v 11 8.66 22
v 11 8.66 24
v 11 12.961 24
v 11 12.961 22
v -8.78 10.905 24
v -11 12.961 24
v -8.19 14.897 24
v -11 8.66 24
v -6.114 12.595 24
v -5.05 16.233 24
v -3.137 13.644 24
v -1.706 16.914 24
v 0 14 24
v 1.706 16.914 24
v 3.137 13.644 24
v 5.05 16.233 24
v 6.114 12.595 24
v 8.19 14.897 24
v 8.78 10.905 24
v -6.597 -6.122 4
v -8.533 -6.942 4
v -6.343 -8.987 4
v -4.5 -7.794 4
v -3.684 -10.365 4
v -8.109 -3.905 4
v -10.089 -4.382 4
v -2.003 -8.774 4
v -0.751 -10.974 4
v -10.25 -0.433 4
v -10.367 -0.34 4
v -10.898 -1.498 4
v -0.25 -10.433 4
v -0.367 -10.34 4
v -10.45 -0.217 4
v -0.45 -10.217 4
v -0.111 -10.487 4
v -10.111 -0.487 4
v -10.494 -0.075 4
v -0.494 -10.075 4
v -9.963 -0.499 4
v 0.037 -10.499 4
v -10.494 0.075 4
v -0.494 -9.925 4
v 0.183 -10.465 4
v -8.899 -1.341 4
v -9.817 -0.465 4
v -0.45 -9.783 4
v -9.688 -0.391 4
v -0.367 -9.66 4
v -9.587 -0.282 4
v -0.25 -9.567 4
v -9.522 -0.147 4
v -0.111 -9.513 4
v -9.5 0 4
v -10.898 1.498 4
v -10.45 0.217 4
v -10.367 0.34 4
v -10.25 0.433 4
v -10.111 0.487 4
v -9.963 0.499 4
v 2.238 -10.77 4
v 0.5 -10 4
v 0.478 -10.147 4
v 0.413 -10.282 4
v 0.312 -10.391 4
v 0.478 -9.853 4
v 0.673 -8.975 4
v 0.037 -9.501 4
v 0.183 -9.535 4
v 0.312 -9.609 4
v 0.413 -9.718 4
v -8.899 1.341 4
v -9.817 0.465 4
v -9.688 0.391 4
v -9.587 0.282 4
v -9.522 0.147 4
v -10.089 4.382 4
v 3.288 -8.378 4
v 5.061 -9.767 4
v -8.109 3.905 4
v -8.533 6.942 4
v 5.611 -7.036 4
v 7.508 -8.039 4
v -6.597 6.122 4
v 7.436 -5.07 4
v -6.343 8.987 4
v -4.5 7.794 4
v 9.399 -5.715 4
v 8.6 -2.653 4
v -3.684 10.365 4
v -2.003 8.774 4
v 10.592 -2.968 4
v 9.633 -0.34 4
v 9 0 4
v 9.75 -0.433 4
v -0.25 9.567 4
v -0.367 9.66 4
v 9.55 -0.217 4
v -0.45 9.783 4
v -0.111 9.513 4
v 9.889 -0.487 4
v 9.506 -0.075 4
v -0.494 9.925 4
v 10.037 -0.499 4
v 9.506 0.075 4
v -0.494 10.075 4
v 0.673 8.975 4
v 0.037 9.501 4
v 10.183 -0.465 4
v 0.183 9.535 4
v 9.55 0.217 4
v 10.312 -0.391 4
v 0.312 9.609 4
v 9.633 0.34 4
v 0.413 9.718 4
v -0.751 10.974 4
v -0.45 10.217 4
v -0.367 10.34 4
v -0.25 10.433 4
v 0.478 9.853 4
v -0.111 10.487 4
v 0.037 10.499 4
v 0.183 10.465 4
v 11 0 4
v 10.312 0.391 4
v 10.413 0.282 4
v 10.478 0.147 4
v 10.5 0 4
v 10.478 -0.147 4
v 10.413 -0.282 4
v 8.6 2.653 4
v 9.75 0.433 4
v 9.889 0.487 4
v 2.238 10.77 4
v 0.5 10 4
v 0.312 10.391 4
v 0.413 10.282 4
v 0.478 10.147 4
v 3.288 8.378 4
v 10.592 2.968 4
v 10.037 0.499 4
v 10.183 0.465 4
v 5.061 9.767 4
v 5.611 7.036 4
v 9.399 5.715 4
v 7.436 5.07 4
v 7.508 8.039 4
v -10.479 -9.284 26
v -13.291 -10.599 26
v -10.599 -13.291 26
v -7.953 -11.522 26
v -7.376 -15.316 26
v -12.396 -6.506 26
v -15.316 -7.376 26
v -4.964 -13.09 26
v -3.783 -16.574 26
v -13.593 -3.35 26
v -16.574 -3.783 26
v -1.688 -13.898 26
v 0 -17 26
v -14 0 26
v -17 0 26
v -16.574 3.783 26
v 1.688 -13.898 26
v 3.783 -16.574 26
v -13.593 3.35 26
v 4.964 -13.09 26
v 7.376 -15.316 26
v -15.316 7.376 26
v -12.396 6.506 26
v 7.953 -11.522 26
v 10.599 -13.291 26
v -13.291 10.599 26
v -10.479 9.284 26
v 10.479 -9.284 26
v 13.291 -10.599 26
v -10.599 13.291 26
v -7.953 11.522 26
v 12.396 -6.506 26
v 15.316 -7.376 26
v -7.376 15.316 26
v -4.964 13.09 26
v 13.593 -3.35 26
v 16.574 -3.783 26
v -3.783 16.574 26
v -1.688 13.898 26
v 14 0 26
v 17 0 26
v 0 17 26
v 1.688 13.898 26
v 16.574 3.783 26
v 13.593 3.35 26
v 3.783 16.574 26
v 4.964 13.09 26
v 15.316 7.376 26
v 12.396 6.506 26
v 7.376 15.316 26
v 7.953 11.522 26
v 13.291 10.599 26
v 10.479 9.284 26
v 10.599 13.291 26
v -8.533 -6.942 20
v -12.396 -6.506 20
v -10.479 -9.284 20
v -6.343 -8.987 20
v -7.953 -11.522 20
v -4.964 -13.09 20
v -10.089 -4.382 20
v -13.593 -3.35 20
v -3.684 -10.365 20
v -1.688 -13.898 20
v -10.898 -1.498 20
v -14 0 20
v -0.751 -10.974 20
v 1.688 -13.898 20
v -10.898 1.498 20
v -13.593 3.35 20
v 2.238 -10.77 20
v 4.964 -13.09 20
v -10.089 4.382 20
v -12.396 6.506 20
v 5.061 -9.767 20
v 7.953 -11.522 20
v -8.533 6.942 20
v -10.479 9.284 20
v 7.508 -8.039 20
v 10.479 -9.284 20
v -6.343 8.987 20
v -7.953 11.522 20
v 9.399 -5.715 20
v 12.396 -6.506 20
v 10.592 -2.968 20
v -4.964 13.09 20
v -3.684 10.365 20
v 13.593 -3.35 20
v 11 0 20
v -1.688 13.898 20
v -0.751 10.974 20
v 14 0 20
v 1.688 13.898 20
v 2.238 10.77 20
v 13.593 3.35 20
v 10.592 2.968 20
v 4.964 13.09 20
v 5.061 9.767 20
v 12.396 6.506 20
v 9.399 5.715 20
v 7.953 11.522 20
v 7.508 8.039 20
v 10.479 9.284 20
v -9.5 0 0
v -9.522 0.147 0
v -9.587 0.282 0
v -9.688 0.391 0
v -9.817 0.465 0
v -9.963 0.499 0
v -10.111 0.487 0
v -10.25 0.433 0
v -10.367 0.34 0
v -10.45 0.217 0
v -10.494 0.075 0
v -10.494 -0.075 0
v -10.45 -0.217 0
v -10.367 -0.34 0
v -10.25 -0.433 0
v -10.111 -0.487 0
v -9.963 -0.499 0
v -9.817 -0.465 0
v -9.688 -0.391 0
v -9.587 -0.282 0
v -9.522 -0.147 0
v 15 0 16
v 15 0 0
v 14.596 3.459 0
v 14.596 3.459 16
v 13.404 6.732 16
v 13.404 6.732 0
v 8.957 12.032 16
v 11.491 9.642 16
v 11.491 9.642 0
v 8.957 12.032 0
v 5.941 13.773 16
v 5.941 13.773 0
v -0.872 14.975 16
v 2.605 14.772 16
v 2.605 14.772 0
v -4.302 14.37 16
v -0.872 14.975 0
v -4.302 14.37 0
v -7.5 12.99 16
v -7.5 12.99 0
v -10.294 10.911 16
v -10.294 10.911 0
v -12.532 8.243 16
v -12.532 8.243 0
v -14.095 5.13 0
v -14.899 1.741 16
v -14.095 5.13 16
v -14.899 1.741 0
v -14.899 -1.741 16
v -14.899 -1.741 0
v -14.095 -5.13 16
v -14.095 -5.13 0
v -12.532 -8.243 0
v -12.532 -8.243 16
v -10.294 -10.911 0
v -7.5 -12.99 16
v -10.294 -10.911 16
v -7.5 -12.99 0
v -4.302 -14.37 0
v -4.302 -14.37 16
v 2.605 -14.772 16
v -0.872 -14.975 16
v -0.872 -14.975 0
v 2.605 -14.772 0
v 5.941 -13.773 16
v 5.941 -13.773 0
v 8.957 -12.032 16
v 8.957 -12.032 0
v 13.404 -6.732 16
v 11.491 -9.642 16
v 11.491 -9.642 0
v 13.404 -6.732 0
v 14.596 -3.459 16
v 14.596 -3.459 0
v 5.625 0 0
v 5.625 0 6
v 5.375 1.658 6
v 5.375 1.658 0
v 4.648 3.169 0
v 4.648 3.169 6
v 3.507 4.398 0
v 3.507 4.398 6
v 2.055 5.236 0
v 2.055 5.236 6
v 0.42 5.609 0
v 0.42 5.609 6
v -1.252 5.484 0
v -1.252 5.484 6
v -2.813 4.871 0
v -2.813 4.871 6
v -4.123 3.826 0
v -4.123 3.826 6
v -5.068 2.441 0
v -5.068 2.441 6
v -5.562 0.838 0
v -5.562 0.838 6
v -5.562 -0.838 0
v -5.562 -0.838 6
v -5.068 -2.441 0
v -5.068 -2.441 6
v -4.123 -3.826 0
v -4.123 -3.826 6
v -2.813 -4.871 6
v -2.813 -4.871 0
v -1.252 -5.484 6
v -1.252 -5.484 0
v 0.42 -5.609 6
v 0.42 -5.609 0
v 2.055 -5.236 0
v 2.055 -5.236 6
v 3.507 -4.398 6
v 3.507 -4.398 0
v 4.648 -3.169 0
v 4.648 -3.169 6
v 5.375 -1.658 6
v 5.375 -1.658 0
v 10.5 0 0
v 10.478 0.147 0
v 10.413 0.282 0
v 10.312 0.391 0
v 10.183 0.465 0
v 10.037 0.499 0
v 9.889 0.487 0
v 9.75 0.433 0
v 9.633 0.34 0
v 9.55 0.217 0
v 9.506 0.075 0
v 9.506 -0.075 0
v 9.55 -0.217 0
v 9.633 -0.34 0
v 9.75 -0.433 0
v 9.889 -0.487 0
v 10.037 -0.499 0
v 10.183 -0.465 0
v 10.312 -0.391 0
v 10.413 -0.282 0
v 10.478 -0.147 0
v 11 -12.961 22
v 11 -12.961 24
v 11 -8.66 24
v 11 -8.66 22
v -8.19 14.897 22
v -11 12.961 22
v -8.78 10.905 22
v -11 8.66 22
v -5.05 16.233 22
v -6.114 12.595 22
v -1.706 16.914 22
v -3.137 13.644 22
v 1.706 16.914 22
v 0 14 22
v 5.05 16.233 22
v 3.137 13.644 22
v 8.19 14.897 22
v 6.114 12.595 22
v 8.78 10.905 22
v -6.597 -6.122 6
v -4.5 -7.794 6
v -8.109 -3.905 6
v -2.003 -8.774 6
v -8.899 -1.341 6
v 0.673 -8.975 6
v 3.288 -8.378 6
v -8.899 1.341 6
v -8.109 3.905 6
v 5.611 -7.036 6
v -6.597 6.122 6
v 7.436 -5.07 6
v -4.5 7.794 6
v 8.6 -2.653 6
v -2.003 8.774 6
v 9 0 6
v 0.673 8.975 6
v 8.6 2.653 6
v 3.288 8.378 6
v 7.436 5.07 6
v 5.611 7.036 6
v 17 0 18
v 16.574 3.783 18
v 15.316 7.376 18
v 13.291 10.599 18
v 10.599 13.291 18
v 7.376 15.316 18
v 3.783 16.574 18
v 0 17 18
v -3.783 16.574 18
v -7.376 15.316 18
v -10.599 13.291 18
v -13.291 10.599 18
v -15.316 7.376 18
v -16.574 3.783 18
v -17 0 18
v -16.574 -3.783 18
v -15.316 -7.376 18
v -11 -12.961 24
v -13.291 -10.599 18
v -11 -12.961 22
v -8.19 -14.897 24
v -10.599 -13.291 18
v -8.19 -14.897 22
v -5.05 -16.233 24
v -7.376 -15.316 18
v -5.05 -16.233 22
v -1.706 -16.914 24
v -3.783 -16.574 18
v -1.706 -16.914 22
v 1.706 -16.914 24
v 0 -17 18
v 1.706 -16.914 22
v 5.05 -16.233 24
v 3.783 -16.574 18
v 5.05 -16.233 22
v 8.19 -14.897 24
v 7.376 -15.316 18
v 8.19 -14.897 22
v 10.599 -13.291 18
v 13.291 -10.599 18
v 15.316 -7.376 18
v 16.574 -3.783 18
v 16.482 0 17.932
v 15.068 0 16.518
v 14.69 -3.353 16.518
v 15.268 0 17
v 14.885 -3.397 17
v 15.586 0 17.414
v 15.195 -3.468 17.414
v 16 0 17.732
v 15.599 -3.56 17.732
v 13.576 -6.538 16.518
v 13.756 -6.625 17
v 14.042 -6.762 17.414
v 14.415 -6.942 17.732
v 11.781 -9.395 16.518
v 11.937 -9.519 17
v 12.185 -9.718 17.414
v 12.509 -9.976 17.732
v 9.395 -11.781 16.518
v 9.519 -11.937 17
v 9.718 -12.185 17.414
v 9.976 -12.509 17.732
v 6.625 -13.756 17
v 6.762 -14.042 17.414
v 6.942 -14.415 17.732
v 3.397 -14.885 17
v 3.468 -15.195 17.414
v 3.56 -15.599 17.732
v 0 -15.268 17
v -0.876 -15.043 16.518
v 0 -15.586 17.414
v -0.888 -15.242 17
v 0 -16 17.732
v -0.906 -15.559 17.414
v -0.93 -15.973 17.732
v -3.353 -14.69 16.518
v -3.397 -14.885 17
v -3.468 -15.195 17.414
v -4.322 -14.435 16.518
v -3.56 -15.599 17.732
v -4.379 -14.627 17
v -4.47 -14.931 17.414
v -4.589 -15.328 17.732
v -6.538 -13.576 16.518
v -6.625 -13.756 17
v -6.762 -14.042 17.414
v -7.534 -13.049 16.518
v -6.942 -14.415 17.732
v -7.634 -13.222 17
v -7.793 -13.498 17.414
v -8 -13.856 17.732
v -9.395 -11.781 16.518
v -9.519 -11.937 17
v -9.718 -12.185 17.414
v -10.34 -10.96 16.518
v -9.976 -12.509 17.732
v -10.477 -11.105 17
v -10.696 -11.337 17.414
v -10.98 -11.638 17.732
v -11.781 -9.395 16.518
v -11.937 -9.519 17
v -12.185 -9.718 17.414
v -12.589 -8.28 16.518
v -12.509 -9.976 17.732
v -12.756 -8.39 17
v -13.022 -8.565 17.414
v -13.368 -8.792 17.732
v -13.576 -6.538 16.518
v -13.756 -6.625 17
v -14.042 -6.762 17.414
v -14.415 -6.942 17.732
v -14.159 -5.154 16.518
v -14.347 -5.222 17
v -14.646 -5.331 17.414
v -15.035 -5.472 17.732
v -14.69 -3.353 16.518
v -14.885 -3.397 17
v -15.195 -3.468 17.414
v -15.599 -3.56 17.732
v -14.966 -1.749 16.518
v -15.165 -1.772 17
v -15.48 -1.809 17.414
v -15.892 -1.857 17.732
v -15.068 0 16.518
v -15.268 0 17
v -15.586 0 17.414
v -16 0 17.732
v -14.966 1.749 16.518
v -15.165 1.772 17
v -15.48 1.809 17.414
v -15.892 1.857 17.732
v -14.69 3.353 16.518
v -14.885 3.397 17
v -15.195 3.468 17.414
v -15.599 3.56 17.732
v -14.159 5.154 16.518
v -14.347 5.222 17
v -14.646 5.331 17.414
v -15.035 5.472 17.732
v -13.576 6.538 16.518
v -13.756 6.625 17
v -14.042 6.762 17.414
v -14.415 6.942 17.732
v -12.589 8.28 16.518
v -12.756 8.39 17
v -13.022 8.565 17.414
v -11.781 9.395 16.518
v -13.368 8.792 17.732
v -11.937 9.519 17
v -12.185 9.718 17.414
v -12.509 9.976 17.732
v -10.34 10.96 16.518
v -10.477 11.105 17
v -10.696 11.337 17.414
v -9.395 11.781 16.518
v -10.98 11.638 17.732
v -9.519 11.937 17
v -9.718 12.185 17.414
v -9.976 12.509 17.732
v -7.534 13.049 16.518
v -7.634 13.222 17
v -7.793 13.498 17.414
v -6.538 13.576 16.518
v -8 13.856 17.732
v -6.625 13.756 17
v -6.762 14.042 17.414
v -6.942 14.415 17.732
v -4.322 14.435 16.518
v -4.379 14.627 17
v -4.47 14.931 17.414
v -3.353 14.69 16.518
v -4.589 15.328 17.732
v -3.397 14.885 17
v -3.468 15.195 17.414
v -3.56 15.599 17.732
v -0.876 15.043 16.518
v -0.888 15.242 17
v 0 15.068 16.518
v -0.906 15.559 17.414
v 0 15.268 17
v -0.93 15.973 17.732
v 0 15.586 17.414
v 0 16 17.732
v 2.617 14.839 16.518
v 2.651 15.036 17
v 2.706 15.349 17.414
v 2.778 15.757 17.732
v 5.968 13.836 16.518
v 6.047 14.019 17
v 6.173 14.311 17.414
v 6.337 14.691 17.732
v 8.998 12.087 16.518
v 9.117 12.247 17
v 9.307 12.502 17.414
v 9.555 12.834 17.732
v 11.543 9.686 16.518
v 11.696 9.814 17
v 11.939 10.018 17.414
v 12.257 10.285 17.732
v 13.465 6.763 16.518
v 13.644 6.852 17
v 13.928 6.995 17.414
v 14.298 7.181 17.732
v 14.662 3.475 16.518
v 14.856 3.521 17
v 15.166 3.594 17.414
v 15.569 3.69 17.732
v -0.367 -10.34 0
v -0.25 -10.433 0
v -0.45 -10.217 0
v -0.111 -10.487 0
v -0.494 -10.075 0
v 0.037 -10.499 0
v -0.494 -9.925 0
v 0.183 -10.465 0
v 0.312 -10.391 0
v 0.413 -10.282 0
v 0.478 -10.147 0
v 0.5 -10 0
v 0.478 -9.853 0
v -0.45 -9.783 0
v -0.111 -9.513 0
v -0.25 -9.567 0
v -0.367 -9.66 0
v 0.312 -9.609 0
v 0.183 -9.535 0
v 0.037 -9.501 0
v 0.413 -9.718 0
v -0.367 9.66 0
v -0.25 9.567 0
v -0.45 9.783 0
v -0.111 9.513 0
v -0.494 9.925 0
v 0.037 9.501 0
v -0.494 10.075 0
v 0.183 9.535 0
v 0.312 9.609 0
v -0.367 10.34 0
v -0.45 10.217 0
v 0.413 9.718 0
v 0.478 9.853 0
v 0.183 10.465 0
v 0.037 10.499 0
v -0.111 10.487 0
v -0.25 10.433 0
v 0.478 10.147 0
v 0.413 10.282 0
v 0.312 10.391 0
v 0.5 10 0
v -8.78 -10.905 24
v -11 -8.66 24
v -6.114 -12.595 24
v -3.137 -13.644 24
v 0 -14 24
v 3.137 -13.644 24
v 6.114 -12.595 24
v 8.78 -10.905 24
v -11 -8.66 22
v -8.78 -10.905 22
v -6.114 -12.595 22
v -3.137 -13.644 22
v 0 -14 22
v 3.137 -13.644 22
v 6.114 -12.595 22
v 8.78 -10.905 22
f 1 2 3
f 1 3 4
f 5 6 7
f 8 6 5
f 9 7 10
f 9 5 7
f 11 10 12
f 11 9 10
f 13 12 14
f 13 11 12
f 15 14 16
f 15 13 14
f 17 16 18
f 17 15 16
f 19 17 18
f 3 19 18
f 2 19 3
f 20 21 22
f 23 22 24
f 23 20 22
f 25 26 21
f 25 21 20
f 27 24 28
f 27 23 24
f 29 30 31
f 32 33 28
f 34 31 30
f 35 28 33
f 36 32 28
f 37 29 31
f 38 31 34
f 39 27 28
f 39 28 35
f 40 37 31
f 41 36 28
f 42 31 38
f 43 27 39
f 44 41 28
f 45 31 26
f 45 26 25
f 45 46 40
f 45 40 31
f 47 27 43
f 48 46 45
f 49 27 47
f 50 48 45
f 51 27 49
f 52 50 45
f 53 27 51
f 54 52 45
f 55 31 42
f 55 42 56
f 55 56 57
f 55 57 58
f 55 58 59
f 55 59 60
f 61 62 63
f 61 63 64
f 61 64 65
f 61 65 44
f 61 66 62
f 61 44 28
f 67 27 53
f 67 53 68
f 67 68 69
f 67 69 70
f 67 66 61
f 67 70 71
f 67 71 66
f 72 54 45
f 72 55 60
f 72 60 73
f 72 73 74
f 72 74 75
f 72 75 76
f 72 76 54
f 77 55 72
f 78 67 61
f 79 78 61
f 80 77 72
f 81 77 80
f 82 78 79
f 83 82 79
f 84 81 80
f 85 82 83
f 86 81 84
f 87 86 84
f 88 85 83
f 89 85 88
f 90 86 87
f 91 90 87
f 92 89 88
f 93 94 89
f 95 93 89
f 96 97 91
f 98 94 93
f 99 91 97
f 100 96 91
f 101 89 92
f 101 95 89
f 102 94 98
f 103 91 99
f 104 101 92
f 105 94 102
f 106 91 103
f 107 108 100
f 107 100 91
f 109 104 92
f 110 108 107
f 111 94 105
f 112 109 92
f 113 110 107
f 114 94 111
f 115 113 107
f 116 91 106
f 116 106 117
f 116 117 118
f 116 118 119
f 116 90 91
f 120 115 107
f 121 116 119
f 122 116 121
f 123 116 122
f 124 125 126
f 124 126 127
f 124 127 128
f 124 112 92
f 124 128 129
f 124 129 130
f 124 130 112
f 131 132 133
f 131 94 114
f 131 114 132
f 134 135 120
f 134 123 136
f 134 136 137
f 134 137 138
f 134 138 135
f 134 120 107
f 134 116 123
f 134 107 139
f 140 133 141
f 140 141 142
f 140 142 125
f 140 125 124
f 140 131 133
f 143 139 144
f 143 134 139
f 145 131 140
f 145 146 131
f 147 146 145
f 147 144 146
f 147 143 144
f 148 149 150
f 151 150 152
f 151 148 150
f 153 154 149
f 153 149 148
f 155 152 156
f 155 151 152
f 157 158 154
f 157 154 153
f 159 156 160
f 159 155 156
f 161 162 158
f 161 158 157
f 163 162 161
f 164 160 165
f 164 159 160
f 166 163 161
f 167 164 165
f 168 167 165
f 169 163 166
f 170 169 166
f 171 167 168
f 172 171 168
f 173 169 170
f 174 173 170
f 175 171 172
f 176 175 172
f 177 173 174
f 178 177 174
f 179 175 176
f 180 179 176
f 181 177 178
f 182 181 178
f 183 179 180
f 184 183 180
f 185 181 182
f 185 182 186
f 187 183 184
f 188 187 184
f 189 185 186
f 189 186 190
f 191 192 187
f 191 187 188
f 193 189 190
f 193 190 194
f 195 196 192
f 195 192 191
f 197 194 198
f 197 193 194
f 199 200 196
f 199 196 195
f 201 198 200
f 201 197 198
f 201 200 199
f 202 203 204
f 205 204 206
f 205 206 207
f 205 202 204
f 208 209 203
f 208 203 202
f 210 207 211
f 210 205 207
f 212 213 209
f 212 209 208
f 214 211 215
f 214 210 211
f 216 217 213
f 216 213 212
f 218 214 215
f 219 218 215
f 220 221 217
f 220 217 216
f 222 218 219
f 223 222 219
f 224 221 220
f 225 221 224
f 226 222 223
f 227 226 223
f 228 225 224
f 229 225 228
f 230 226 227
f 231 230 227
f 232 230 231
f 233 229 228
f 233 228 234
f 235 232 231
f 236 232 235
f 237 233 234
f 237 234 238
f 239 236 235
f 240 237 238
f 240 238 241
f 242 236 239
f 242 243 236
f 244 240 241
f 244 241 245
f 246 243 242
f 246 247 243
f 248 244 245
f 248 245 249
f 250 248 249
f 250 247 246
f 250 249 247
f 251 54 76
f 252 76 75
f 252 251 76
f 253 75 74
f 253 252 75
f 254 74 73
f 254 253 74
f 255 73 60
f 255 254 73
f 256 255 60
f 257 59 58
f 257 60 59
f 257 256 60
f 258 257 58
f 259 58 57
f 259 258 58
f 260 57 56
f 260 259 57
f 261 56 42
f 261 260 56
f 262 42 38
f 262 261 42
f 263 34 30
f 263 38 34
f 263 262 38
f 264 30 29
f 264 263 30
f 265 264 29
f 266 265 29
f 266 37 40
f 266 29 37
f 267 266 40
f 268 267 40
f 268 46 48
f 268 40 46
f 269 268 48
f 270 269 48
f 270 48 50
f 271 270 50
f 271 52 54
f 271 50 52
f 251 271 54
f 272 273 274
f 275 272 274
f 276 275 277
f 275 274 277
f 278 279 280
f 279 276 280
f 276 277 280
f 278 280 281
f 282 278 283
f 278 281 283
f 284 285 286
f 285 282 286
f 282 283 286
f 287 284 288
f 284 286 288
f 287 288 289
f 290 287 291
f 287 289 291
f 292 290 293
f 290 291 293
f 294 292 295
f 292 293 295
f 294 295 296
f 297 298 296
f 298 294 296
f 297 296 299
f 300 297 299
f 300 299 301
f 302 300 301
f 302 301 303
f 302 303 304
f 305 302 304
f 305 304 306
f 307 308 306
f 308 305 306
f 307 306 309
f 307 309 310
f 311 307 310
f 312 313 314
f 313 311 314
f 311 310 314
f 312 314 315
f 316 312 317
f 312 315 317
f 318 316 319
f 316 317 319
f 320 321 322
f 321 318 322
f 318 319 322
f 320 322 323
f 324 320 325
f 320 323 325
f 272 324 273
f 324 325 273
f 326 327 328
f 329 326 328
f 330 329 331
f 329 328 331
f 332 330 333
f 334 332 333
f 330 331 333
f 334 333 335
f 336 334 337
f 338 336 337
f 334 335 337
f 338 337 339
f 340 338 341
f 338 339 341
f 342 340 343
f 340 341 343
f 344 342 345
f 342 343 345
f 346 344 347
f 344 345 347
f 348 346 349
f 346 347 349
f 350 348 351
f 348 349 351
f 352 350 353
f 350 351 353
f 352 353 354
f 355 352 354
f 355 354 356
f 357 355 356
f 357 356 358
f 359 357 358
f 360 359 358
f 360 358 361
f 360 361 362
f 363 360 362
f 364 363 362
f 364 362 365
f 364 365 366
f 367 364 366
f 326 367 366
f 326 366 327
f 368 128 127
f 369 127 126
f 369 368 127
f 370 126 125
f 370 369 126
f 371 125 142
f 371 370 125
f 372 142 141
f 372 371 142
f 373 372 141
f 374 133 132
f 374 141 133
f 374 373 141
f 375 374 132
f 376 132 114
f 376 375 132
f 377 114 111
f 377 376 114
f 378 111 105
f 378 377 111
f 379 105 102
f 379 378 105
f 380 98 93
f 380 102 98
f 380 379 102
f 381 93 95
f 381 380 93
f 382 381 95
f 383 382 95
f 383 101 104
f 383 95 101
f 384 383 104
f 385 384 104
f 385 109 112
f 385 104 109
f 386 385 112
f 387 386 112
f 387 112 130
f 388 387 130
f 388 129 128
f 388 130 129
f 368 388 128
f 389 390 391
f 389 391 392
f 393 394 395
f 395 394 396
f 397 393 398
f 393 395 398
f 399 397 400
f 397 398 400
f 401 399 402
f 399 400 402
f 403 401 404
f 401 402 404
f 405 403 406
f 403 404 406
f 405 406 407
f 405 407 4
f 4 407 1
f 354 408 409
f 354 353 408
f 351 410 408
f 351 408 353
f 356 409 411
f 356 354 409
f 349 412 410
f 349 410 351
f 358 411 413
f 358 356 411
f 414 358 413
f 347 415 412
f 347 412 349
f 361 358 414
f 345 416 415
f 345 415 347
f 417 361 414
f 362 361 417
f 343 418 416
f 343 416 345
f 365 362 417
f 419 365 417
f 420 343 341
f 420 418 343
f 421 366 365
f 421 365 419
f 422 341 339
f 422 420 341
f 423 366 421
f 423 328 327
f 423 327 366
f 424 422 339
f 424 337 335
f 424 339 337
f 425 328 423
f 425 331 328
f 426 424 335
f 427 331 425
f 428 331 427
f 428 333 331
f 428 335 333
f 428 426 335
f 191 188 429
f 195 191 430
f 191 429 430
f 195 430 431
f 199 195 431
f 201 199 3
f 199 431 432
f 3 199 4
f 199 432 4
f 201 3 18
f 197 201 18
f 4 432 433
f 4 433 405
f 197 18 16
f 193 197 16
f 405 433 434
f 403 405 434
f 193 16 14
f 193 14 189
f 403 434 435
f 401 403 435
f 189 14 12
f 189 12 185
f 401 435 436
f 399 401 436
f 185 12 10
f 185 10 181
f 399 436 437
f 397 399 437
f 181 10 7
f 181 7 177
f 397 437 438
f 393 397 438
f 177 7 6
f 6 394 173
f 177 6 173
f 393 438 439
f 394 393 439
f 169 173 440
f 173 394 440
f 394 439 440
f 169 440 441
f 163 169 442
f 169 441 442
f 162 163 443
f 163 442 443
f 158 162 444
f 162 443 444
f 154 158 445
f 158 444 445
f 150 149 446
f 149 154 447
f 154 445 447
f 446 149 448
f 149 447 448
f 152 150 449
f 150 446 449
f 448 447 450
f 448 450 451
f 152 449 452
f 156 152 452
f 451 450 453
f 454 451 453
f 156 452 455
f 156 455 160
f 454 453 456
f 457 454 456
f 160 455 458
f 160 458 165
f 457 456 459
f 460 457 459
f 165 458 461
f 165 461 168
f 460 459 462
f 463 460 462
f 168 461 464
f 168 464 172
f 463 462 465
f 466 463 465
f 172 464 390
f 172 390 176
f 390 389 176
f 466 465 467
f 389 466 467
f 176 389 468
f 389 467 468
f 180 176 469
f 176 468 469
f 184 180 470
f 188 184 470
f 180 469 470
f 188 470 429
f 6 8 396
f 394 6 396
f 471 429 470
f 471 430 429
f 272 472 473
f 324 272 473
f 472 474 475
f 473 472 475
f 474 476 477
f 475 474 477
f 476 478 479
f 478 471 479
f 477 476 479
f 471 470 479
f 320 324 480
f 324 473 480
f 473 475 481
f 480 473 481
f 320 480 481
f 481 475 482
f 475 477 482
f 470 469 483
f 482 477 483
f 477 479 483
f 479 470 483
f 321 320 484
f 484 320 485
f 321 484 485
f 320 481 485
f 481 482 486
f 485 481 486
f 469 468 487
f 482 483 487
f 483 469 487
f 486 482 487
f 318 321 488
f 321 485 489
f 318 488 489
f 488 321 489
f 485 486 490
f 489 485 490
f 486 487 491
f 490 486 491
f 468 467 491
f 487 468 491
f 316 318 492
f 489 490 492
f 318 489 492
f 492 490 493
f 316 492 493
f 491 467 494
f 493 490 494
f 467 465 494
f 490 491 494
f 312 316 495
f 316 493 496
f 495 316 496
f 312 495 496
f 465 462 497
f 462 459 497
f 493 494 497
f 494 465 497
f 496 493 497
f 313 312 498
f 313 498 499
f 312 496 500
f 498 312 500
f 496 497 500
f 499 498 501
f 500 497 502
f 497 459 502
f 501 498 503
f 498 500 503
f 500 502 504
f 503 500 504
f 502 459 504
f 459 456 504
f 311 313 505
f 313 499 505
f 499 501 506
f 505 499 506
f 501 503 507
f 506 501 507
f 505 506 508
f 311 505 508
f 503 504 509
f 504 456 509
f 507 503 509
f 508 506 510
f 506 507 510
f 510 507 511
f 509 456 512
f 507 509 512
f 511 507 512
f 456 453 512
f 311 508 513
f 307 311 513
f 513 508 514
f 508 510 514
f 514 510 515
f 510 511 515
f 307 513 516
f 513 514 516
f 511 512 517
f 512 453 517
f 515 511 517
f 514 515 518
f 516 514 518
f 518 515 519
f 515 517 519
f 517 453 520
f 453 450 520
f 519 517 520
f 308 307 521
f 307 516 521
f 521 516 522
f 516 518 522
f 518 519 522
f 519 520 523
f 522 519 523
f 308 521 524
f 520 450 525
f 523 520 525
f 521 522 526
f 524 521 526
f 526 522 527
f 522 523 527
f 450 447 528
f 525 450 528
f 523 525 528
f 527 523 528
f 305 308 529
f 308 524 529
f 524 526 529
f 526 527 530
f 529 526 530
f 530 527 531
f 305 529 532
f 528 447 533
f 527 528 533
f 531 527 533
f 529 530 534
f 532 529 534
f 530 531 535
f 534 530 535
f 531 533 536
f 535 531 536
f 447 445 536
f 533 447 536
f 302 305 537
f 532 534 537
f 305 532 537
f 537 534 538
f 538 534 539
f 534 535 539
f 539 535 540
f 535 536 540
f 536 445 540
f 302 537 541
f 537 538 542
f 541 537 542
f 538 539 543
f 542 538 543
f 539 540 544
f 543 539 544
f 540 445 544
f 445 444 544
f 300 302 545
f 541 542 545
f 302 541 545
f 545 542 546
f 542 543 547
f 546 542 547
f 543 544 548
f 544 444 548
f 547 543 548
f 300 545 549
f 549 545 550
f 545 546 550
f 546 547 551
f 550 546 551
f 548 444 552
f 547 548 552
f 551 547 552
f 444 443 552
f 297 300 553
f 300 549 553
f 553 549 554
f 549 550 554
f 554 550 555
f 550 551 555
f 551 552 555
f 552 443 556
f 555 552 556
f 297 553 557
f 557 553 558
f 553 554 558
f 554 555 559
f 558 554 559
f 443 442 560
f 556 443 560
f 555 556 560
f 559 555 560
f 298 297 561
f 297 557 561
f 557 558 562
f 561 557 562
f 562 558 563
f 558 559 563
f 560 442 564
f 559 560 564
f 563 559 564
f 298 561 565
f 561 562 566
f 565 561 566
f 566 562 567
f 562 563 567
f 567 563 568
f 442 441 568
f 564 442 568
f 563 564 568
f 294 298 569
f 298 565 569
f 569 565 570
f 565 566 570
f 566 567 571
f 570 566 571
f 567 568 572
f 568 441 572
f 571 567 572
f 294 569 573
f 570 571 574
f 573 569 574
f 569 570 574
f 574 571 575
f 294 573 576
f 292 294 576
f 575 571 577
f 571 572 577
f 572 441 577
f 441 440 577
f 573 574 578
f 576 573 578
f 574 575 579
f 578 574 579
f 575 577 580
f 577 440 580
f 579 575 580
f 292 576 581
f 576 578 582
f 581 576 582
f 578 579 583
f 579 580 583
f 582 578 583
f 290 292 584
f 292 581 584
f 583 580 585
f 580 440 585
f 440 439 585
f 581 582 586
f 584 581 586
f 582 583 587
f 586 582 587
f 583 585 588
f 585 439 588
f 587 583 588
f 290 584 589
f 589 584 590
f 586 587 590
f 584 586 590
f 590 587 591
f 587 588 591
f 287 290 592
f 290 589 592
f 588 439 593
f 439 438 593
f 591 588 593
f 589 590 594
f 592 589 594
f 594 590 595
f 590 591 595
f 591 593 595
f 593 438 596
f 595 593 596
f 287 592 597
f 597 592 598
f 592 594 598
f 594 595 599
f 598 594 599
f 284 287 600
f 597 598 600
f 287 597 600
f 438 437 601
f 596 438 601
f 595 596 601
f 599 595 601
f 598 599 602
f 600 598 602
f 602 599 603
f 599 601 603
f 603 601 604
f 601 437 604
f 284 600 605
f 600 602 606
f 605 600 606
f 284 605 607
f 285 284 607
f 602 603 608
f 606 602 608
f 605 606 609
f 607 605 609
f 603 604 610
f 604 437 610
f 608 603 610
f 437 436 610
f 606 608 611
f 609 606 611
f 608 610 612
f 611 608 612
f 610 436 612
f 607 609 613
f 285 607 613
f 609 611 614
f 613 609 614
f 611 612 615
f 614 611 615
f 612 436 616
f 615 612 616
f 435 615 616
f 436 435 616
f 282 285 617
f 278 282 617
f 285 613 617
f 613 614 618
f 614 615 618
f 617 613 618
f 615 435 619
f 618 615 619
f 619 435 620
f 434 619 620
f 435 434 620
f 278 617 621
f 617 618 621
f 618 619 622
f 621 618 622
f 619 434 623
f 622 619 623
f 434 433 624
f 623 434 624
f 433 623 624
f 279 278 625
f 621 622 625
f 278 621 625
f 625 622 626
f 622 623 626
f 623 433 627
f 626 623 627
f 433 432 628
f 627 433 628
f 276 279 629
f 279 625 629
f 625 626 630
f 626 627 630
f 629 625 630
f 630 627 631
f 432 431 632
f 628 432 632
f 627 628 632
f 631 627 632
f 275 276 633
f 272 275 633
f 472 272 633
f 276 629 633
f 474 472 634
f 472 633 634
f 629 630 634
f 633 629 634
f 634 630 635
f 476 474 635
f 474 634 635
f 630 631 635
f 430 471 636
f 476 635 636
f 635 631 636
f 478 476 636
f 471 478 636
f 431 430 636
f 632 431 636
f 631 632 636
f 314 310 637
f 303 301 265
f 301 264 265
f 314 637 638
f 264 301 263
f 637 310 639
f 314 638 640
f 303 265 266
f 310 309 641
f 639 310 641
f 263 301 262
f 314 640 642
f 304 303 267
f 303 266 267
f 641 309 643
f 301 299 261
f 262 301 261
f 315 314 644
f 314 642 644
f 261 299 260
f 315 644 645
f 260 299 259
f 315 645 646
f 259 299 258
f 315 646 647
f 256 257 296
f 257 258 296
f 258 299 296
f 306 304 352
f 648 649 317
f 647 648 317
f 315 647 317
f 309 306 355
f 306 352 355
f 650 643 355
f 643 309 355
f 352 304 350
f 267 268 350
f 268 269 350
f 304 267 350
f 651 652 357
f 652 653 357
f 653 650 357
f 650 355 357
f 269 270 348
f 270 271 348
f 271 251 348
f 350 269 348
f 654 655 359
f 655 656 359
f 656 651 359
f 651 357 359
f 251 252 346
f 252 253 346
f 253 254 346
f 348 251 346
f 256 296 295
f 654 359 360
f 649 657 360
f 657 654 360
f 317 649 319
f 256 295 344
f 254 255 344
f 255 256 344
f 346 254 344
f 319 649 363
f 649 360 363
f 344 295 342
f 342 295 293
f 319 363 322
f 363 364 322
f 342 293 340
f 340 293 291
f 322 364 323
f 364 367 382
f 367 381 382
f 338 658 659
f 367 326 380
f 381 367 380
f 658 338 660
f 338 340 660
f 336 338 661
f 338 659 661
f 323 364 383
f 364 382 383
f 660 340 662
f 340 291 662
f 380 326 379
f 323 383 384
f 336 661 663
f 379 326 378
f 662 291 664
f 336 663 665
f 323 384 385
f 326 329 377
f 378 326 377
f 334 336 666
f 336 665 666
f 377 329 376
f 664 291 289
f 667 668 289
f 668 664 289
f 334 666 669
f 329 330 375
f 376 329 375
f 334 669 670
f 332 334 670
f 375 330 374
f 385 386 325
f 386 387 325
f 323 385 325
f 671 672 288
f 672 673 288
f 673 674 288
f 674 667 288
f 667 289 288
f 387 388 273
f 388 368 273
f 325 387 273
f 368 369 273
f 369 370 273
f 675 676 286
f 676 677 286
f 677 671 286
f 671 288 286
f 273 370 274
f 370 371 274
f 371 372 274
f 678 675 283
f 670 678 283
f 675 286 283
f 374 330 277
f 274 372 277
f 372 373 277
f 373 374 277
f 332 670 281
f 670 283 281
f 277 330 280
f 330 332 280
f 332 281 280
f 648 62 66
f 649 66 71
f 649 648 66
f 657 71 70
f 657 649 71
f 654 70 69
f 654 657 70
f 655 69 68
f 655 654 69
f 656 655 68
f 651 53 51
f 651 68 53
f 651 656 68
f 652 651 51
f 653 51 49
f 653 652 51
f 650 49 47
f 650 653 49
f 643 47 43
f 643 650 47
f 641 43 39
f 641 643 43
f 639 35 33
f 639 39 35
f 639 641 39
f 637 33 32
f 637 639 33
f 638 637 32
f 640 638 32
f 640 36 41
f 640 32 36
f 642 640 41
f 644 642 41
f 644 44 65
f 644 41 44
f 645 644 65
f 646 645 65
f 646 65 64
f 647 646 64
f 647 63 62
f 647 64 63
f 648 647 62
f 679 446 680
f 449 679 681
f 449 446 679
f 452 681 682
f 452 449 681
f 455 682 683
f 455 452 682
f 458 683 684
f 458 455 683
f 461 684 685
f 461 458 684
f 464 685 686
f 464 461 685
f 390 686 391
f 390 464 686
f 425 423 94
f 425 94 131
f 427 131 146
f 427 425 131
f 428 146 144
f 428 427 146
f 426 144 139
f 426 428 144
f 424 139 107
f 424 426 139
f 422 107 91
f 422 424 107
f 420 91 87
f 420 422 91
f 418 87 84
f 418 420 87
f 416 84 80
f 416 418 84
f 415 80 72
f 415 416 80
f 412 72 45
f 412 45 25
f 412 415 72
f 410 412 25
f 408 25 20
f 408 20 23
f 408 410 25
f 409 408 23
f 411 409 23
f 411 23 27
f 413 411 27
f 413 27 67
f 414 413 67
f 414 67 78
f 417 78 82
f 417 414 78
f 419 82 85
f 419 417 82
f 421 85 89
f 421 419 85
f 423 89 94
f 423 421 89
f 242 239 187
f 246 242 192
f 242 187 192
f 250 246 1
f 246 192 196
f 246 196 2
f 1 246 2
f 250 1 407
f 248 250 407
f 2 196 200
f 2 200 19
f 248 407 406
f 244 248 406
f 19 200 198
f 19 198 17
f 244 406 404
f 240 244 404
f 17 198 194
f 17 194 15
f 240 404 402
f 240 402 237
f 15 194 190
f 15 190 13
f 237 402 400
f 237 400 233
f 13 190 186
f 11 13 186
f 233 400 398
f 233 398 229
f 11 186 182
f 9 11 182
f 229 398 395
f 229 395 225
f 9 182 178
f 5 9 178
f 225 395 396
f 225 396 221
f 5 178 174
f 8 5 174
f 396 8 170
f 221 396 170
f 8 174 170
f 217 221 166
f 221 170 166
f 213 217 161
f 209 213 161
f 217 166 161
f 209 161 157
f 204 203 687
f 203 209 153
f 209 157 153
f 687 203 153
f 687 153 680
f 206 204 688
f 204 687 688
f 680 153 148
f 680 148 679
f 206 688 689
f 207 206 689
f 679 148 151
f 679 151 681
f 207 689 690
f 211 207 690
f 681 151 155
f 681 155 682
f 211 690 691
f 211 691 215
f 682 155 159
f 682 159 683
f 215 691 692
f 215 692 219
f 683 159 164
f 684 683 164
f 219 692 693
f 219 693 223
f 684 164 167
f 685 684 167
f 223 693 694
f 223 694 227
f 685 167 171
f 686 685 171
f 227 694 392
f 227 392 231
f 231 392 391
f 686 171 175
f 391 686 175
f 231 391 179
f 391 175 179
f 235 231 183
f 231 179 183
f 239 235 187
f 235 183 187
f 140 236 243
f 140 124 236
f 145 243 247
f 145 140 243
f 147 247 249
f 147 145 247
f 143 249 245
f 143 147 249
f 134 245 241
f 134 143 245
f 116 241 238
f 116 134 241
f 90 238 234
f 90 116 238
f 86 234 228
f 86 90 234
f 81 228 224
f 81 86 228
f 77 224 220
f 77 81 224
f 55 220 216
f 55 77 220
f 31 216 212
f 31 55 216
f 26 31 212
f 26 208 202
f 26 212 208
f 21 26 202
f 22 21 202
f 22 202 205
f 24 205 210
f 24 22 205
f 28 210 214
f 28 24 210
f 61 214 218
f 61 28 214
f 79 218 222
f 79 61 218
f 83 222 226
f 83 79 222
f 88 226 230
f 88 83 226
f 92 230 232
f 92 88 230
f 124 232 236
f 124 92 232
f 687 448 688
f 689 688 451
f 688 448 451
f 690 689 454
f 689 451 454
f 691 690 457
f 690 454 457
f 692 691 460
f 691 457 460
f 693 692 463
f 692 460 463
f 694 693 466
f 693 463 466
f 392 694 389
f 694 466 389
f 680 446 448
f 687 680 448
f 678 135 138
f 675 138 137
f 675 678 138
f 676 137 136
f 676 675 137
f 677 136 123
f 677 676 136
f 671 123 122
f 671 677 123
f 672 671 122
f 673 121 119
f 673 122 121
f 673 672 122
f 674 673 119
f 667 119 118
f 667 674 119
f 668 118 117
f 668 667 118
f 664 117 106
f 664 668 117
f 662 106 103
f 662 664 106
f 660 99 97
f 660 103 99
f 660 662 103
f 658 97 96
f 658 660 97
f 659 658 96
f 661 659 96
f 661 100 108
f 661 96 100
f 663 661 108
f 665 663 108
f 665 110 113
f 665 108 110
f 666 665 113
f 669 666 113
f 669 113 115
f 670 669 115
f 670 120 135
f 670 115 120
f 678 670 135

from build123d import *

# Parameters (mm, degrees)
SKETCH1_R                = 15
BOSS_EXTRUDE5_DEPTH      = 26
SKETCH3_R                = 5.625
CUT_EXTRUDE2_DEPTH       = 34.555923471
CUT_EXTRUDE3_DEPTH       = 28
CUT_EXTRUDE3_DEPTH_BACK  = 20
SKETCH4_R                = 11
CUT_EXTRUDE6_START       = 6
SKETCH7_R                = 11
SKETCH7_R_2              = 9
CUT_EXTRUDE6_DEPTH       = 2
BOSS_EXTRUDE8_DEPTH      = 6
BOSS_EXTRUDE8_DEPTH_BACK = 2
BOSS_EXTRUDE8_START      = 20
SKETCH12_R               = 17
CUT_EXTRUDE10_START      = 18
SKETCH13_R               = 11
CUT_EXTRUDE10_DEPTH      = 18.411862419
FILLET2_R                = 2
CUT_EXTRUDE11_START      = 26
SKETCH14_R               = 14
CUT_EXTRUDE11_DEPTH      = 6
SKETCH15_R               = 0.5
CUT_EXTRUDE14_DEPTH      = 36.411862419
CUT_EXTRUDE15_DEPTH      = 36.411862419
CUT_EXTRUDE15_DEPTH_BACK = 36.411862419
SKETCH18_W               = 22
SKETCH18_H               = 2


with BuildPart() as part:
    # Sketch1 → Boss-Extrude5 (new body)
    with BuildSketch(Plane.XY):
        Circle(SKETCH1_R)
    extrude(amount=BOSS_EXTRUDE5_DEPTH)

    # Sketch3 → Cut-Extrude2 (cut, through all)
    with BuildSketch(Plane.XY.offset(26)):
        Circle(SKETCH3_R)
    extrude(amount=-CUT_EXTRUDE2_DEPTH, mode=Mode.SUBTRACT)

    # Sketch4 → Cut-Extrude3 (cut, two sides: drawn at the far end of the back side and taken through both)
    with BuildSketch(Plane.XY.offset(26).offset(-CUT_EXTRUDE3_DEPTH_BACK)):
        Circle(SKETCH4_R)
    extrude(amount=CUT_EXTRUDE3_DEPTH + CUT_EXTRUDE3_DEPTH_BACK, mode=Mode.SUBTRACT)

    # Sketch7 → Cut-Extrude6 (cut)
    with BuildSketch(Plane.XY.offset(CUT_EXTRUDE6_START)):
        Circle(SKETCH7_R)
        Circle(SKETCH7_R_2, mode=Mode.SUBTRACT)
    extrude(amount=-CUT_EXTRUDE6_DEPTH, mode=Mode.SUBTRACT)

    # Sketch12 → Boss-Extrude8 (add, two sides: drawn at the far end of the back side and taken through both)
    with BuildSketch(Plane.XY.offset(BOSS_EXTRUDE8_START - BOSS_EXTRUDE8_DEPTH_BACK)):
        Circle(SKETCH12_R)
    extrude(amount=BOSS_EXTRUDE8_DEPTH + BOSS_EXTRUDE8_DEPTH_BACK)

    # Sketch13 → Cut-Extrude10 (cut, through all)
    with BuildSketch(Plane.XY.offset(CUT_EXTRUDE10_START)):
        Circle(SKETCH13_R)
    extrude(amount=CUT_EXTRUDE10_DEPTH, mode=Mode.SUBTRACT)

    # Fillet2
    fillet2_edges = [part.edges().sort_by_distance(p)[0] for p in [
        (-15, 0, 18),
    ]]
    fillet(fillet2_edges, radius=FILLET2_R - 0.0001)  # a hair under: the kernel refuses the full size

    # Sketch14 → Cut-Extrude11 (cut)
    with BuildSketch(Plane.XY.offset(CUT_EXTRUDE11_START)):
        Circle(SKETCH14_R)
    extrude(amount=-CUT_EXTRUDE11_DEPTH, mode=Mode.SUBTRACT)

    # Sketch15 → Cut-Extrude14 (cut, through all)
    with BuildSketch(Plane.XY):
        with Locations((0, 10)):
            Circle(SKETCH15_R)
        with Locations((0, -10)):
            Circle(SKETCH15_R)
        with Locations((10, 0)):
            Circle(SKETCH15_R)
        with Locations((-10, 0)):
            Circle(SKETCH15_R)
    extrude(amount=CUT_EXTRUDE14_DEPTH, mode=Mode.SUBTRACT)

    # Sketch18 → Cut-Extrude15 (cut, two sides: drawn at the far end of the back side and taken through both)
    with BuildSketch(Plane(origin=(0, 0, 0), x_dir=(1, 0, 0), z_dir=(0, 1, 0)).offset(-CUT_EXTRUDE15_DEPTH_BACK)):
        with Locations((0, -23)):
            Rectangle(SKETCH18_W, SKETCH18_H)
    extrude(amount=CUT_EXTRUDE15_DEPTH + CUT_EXTRUDE15_DEPTH_BACK, mode=Mode.SUBTRACT)


solid = part.part
